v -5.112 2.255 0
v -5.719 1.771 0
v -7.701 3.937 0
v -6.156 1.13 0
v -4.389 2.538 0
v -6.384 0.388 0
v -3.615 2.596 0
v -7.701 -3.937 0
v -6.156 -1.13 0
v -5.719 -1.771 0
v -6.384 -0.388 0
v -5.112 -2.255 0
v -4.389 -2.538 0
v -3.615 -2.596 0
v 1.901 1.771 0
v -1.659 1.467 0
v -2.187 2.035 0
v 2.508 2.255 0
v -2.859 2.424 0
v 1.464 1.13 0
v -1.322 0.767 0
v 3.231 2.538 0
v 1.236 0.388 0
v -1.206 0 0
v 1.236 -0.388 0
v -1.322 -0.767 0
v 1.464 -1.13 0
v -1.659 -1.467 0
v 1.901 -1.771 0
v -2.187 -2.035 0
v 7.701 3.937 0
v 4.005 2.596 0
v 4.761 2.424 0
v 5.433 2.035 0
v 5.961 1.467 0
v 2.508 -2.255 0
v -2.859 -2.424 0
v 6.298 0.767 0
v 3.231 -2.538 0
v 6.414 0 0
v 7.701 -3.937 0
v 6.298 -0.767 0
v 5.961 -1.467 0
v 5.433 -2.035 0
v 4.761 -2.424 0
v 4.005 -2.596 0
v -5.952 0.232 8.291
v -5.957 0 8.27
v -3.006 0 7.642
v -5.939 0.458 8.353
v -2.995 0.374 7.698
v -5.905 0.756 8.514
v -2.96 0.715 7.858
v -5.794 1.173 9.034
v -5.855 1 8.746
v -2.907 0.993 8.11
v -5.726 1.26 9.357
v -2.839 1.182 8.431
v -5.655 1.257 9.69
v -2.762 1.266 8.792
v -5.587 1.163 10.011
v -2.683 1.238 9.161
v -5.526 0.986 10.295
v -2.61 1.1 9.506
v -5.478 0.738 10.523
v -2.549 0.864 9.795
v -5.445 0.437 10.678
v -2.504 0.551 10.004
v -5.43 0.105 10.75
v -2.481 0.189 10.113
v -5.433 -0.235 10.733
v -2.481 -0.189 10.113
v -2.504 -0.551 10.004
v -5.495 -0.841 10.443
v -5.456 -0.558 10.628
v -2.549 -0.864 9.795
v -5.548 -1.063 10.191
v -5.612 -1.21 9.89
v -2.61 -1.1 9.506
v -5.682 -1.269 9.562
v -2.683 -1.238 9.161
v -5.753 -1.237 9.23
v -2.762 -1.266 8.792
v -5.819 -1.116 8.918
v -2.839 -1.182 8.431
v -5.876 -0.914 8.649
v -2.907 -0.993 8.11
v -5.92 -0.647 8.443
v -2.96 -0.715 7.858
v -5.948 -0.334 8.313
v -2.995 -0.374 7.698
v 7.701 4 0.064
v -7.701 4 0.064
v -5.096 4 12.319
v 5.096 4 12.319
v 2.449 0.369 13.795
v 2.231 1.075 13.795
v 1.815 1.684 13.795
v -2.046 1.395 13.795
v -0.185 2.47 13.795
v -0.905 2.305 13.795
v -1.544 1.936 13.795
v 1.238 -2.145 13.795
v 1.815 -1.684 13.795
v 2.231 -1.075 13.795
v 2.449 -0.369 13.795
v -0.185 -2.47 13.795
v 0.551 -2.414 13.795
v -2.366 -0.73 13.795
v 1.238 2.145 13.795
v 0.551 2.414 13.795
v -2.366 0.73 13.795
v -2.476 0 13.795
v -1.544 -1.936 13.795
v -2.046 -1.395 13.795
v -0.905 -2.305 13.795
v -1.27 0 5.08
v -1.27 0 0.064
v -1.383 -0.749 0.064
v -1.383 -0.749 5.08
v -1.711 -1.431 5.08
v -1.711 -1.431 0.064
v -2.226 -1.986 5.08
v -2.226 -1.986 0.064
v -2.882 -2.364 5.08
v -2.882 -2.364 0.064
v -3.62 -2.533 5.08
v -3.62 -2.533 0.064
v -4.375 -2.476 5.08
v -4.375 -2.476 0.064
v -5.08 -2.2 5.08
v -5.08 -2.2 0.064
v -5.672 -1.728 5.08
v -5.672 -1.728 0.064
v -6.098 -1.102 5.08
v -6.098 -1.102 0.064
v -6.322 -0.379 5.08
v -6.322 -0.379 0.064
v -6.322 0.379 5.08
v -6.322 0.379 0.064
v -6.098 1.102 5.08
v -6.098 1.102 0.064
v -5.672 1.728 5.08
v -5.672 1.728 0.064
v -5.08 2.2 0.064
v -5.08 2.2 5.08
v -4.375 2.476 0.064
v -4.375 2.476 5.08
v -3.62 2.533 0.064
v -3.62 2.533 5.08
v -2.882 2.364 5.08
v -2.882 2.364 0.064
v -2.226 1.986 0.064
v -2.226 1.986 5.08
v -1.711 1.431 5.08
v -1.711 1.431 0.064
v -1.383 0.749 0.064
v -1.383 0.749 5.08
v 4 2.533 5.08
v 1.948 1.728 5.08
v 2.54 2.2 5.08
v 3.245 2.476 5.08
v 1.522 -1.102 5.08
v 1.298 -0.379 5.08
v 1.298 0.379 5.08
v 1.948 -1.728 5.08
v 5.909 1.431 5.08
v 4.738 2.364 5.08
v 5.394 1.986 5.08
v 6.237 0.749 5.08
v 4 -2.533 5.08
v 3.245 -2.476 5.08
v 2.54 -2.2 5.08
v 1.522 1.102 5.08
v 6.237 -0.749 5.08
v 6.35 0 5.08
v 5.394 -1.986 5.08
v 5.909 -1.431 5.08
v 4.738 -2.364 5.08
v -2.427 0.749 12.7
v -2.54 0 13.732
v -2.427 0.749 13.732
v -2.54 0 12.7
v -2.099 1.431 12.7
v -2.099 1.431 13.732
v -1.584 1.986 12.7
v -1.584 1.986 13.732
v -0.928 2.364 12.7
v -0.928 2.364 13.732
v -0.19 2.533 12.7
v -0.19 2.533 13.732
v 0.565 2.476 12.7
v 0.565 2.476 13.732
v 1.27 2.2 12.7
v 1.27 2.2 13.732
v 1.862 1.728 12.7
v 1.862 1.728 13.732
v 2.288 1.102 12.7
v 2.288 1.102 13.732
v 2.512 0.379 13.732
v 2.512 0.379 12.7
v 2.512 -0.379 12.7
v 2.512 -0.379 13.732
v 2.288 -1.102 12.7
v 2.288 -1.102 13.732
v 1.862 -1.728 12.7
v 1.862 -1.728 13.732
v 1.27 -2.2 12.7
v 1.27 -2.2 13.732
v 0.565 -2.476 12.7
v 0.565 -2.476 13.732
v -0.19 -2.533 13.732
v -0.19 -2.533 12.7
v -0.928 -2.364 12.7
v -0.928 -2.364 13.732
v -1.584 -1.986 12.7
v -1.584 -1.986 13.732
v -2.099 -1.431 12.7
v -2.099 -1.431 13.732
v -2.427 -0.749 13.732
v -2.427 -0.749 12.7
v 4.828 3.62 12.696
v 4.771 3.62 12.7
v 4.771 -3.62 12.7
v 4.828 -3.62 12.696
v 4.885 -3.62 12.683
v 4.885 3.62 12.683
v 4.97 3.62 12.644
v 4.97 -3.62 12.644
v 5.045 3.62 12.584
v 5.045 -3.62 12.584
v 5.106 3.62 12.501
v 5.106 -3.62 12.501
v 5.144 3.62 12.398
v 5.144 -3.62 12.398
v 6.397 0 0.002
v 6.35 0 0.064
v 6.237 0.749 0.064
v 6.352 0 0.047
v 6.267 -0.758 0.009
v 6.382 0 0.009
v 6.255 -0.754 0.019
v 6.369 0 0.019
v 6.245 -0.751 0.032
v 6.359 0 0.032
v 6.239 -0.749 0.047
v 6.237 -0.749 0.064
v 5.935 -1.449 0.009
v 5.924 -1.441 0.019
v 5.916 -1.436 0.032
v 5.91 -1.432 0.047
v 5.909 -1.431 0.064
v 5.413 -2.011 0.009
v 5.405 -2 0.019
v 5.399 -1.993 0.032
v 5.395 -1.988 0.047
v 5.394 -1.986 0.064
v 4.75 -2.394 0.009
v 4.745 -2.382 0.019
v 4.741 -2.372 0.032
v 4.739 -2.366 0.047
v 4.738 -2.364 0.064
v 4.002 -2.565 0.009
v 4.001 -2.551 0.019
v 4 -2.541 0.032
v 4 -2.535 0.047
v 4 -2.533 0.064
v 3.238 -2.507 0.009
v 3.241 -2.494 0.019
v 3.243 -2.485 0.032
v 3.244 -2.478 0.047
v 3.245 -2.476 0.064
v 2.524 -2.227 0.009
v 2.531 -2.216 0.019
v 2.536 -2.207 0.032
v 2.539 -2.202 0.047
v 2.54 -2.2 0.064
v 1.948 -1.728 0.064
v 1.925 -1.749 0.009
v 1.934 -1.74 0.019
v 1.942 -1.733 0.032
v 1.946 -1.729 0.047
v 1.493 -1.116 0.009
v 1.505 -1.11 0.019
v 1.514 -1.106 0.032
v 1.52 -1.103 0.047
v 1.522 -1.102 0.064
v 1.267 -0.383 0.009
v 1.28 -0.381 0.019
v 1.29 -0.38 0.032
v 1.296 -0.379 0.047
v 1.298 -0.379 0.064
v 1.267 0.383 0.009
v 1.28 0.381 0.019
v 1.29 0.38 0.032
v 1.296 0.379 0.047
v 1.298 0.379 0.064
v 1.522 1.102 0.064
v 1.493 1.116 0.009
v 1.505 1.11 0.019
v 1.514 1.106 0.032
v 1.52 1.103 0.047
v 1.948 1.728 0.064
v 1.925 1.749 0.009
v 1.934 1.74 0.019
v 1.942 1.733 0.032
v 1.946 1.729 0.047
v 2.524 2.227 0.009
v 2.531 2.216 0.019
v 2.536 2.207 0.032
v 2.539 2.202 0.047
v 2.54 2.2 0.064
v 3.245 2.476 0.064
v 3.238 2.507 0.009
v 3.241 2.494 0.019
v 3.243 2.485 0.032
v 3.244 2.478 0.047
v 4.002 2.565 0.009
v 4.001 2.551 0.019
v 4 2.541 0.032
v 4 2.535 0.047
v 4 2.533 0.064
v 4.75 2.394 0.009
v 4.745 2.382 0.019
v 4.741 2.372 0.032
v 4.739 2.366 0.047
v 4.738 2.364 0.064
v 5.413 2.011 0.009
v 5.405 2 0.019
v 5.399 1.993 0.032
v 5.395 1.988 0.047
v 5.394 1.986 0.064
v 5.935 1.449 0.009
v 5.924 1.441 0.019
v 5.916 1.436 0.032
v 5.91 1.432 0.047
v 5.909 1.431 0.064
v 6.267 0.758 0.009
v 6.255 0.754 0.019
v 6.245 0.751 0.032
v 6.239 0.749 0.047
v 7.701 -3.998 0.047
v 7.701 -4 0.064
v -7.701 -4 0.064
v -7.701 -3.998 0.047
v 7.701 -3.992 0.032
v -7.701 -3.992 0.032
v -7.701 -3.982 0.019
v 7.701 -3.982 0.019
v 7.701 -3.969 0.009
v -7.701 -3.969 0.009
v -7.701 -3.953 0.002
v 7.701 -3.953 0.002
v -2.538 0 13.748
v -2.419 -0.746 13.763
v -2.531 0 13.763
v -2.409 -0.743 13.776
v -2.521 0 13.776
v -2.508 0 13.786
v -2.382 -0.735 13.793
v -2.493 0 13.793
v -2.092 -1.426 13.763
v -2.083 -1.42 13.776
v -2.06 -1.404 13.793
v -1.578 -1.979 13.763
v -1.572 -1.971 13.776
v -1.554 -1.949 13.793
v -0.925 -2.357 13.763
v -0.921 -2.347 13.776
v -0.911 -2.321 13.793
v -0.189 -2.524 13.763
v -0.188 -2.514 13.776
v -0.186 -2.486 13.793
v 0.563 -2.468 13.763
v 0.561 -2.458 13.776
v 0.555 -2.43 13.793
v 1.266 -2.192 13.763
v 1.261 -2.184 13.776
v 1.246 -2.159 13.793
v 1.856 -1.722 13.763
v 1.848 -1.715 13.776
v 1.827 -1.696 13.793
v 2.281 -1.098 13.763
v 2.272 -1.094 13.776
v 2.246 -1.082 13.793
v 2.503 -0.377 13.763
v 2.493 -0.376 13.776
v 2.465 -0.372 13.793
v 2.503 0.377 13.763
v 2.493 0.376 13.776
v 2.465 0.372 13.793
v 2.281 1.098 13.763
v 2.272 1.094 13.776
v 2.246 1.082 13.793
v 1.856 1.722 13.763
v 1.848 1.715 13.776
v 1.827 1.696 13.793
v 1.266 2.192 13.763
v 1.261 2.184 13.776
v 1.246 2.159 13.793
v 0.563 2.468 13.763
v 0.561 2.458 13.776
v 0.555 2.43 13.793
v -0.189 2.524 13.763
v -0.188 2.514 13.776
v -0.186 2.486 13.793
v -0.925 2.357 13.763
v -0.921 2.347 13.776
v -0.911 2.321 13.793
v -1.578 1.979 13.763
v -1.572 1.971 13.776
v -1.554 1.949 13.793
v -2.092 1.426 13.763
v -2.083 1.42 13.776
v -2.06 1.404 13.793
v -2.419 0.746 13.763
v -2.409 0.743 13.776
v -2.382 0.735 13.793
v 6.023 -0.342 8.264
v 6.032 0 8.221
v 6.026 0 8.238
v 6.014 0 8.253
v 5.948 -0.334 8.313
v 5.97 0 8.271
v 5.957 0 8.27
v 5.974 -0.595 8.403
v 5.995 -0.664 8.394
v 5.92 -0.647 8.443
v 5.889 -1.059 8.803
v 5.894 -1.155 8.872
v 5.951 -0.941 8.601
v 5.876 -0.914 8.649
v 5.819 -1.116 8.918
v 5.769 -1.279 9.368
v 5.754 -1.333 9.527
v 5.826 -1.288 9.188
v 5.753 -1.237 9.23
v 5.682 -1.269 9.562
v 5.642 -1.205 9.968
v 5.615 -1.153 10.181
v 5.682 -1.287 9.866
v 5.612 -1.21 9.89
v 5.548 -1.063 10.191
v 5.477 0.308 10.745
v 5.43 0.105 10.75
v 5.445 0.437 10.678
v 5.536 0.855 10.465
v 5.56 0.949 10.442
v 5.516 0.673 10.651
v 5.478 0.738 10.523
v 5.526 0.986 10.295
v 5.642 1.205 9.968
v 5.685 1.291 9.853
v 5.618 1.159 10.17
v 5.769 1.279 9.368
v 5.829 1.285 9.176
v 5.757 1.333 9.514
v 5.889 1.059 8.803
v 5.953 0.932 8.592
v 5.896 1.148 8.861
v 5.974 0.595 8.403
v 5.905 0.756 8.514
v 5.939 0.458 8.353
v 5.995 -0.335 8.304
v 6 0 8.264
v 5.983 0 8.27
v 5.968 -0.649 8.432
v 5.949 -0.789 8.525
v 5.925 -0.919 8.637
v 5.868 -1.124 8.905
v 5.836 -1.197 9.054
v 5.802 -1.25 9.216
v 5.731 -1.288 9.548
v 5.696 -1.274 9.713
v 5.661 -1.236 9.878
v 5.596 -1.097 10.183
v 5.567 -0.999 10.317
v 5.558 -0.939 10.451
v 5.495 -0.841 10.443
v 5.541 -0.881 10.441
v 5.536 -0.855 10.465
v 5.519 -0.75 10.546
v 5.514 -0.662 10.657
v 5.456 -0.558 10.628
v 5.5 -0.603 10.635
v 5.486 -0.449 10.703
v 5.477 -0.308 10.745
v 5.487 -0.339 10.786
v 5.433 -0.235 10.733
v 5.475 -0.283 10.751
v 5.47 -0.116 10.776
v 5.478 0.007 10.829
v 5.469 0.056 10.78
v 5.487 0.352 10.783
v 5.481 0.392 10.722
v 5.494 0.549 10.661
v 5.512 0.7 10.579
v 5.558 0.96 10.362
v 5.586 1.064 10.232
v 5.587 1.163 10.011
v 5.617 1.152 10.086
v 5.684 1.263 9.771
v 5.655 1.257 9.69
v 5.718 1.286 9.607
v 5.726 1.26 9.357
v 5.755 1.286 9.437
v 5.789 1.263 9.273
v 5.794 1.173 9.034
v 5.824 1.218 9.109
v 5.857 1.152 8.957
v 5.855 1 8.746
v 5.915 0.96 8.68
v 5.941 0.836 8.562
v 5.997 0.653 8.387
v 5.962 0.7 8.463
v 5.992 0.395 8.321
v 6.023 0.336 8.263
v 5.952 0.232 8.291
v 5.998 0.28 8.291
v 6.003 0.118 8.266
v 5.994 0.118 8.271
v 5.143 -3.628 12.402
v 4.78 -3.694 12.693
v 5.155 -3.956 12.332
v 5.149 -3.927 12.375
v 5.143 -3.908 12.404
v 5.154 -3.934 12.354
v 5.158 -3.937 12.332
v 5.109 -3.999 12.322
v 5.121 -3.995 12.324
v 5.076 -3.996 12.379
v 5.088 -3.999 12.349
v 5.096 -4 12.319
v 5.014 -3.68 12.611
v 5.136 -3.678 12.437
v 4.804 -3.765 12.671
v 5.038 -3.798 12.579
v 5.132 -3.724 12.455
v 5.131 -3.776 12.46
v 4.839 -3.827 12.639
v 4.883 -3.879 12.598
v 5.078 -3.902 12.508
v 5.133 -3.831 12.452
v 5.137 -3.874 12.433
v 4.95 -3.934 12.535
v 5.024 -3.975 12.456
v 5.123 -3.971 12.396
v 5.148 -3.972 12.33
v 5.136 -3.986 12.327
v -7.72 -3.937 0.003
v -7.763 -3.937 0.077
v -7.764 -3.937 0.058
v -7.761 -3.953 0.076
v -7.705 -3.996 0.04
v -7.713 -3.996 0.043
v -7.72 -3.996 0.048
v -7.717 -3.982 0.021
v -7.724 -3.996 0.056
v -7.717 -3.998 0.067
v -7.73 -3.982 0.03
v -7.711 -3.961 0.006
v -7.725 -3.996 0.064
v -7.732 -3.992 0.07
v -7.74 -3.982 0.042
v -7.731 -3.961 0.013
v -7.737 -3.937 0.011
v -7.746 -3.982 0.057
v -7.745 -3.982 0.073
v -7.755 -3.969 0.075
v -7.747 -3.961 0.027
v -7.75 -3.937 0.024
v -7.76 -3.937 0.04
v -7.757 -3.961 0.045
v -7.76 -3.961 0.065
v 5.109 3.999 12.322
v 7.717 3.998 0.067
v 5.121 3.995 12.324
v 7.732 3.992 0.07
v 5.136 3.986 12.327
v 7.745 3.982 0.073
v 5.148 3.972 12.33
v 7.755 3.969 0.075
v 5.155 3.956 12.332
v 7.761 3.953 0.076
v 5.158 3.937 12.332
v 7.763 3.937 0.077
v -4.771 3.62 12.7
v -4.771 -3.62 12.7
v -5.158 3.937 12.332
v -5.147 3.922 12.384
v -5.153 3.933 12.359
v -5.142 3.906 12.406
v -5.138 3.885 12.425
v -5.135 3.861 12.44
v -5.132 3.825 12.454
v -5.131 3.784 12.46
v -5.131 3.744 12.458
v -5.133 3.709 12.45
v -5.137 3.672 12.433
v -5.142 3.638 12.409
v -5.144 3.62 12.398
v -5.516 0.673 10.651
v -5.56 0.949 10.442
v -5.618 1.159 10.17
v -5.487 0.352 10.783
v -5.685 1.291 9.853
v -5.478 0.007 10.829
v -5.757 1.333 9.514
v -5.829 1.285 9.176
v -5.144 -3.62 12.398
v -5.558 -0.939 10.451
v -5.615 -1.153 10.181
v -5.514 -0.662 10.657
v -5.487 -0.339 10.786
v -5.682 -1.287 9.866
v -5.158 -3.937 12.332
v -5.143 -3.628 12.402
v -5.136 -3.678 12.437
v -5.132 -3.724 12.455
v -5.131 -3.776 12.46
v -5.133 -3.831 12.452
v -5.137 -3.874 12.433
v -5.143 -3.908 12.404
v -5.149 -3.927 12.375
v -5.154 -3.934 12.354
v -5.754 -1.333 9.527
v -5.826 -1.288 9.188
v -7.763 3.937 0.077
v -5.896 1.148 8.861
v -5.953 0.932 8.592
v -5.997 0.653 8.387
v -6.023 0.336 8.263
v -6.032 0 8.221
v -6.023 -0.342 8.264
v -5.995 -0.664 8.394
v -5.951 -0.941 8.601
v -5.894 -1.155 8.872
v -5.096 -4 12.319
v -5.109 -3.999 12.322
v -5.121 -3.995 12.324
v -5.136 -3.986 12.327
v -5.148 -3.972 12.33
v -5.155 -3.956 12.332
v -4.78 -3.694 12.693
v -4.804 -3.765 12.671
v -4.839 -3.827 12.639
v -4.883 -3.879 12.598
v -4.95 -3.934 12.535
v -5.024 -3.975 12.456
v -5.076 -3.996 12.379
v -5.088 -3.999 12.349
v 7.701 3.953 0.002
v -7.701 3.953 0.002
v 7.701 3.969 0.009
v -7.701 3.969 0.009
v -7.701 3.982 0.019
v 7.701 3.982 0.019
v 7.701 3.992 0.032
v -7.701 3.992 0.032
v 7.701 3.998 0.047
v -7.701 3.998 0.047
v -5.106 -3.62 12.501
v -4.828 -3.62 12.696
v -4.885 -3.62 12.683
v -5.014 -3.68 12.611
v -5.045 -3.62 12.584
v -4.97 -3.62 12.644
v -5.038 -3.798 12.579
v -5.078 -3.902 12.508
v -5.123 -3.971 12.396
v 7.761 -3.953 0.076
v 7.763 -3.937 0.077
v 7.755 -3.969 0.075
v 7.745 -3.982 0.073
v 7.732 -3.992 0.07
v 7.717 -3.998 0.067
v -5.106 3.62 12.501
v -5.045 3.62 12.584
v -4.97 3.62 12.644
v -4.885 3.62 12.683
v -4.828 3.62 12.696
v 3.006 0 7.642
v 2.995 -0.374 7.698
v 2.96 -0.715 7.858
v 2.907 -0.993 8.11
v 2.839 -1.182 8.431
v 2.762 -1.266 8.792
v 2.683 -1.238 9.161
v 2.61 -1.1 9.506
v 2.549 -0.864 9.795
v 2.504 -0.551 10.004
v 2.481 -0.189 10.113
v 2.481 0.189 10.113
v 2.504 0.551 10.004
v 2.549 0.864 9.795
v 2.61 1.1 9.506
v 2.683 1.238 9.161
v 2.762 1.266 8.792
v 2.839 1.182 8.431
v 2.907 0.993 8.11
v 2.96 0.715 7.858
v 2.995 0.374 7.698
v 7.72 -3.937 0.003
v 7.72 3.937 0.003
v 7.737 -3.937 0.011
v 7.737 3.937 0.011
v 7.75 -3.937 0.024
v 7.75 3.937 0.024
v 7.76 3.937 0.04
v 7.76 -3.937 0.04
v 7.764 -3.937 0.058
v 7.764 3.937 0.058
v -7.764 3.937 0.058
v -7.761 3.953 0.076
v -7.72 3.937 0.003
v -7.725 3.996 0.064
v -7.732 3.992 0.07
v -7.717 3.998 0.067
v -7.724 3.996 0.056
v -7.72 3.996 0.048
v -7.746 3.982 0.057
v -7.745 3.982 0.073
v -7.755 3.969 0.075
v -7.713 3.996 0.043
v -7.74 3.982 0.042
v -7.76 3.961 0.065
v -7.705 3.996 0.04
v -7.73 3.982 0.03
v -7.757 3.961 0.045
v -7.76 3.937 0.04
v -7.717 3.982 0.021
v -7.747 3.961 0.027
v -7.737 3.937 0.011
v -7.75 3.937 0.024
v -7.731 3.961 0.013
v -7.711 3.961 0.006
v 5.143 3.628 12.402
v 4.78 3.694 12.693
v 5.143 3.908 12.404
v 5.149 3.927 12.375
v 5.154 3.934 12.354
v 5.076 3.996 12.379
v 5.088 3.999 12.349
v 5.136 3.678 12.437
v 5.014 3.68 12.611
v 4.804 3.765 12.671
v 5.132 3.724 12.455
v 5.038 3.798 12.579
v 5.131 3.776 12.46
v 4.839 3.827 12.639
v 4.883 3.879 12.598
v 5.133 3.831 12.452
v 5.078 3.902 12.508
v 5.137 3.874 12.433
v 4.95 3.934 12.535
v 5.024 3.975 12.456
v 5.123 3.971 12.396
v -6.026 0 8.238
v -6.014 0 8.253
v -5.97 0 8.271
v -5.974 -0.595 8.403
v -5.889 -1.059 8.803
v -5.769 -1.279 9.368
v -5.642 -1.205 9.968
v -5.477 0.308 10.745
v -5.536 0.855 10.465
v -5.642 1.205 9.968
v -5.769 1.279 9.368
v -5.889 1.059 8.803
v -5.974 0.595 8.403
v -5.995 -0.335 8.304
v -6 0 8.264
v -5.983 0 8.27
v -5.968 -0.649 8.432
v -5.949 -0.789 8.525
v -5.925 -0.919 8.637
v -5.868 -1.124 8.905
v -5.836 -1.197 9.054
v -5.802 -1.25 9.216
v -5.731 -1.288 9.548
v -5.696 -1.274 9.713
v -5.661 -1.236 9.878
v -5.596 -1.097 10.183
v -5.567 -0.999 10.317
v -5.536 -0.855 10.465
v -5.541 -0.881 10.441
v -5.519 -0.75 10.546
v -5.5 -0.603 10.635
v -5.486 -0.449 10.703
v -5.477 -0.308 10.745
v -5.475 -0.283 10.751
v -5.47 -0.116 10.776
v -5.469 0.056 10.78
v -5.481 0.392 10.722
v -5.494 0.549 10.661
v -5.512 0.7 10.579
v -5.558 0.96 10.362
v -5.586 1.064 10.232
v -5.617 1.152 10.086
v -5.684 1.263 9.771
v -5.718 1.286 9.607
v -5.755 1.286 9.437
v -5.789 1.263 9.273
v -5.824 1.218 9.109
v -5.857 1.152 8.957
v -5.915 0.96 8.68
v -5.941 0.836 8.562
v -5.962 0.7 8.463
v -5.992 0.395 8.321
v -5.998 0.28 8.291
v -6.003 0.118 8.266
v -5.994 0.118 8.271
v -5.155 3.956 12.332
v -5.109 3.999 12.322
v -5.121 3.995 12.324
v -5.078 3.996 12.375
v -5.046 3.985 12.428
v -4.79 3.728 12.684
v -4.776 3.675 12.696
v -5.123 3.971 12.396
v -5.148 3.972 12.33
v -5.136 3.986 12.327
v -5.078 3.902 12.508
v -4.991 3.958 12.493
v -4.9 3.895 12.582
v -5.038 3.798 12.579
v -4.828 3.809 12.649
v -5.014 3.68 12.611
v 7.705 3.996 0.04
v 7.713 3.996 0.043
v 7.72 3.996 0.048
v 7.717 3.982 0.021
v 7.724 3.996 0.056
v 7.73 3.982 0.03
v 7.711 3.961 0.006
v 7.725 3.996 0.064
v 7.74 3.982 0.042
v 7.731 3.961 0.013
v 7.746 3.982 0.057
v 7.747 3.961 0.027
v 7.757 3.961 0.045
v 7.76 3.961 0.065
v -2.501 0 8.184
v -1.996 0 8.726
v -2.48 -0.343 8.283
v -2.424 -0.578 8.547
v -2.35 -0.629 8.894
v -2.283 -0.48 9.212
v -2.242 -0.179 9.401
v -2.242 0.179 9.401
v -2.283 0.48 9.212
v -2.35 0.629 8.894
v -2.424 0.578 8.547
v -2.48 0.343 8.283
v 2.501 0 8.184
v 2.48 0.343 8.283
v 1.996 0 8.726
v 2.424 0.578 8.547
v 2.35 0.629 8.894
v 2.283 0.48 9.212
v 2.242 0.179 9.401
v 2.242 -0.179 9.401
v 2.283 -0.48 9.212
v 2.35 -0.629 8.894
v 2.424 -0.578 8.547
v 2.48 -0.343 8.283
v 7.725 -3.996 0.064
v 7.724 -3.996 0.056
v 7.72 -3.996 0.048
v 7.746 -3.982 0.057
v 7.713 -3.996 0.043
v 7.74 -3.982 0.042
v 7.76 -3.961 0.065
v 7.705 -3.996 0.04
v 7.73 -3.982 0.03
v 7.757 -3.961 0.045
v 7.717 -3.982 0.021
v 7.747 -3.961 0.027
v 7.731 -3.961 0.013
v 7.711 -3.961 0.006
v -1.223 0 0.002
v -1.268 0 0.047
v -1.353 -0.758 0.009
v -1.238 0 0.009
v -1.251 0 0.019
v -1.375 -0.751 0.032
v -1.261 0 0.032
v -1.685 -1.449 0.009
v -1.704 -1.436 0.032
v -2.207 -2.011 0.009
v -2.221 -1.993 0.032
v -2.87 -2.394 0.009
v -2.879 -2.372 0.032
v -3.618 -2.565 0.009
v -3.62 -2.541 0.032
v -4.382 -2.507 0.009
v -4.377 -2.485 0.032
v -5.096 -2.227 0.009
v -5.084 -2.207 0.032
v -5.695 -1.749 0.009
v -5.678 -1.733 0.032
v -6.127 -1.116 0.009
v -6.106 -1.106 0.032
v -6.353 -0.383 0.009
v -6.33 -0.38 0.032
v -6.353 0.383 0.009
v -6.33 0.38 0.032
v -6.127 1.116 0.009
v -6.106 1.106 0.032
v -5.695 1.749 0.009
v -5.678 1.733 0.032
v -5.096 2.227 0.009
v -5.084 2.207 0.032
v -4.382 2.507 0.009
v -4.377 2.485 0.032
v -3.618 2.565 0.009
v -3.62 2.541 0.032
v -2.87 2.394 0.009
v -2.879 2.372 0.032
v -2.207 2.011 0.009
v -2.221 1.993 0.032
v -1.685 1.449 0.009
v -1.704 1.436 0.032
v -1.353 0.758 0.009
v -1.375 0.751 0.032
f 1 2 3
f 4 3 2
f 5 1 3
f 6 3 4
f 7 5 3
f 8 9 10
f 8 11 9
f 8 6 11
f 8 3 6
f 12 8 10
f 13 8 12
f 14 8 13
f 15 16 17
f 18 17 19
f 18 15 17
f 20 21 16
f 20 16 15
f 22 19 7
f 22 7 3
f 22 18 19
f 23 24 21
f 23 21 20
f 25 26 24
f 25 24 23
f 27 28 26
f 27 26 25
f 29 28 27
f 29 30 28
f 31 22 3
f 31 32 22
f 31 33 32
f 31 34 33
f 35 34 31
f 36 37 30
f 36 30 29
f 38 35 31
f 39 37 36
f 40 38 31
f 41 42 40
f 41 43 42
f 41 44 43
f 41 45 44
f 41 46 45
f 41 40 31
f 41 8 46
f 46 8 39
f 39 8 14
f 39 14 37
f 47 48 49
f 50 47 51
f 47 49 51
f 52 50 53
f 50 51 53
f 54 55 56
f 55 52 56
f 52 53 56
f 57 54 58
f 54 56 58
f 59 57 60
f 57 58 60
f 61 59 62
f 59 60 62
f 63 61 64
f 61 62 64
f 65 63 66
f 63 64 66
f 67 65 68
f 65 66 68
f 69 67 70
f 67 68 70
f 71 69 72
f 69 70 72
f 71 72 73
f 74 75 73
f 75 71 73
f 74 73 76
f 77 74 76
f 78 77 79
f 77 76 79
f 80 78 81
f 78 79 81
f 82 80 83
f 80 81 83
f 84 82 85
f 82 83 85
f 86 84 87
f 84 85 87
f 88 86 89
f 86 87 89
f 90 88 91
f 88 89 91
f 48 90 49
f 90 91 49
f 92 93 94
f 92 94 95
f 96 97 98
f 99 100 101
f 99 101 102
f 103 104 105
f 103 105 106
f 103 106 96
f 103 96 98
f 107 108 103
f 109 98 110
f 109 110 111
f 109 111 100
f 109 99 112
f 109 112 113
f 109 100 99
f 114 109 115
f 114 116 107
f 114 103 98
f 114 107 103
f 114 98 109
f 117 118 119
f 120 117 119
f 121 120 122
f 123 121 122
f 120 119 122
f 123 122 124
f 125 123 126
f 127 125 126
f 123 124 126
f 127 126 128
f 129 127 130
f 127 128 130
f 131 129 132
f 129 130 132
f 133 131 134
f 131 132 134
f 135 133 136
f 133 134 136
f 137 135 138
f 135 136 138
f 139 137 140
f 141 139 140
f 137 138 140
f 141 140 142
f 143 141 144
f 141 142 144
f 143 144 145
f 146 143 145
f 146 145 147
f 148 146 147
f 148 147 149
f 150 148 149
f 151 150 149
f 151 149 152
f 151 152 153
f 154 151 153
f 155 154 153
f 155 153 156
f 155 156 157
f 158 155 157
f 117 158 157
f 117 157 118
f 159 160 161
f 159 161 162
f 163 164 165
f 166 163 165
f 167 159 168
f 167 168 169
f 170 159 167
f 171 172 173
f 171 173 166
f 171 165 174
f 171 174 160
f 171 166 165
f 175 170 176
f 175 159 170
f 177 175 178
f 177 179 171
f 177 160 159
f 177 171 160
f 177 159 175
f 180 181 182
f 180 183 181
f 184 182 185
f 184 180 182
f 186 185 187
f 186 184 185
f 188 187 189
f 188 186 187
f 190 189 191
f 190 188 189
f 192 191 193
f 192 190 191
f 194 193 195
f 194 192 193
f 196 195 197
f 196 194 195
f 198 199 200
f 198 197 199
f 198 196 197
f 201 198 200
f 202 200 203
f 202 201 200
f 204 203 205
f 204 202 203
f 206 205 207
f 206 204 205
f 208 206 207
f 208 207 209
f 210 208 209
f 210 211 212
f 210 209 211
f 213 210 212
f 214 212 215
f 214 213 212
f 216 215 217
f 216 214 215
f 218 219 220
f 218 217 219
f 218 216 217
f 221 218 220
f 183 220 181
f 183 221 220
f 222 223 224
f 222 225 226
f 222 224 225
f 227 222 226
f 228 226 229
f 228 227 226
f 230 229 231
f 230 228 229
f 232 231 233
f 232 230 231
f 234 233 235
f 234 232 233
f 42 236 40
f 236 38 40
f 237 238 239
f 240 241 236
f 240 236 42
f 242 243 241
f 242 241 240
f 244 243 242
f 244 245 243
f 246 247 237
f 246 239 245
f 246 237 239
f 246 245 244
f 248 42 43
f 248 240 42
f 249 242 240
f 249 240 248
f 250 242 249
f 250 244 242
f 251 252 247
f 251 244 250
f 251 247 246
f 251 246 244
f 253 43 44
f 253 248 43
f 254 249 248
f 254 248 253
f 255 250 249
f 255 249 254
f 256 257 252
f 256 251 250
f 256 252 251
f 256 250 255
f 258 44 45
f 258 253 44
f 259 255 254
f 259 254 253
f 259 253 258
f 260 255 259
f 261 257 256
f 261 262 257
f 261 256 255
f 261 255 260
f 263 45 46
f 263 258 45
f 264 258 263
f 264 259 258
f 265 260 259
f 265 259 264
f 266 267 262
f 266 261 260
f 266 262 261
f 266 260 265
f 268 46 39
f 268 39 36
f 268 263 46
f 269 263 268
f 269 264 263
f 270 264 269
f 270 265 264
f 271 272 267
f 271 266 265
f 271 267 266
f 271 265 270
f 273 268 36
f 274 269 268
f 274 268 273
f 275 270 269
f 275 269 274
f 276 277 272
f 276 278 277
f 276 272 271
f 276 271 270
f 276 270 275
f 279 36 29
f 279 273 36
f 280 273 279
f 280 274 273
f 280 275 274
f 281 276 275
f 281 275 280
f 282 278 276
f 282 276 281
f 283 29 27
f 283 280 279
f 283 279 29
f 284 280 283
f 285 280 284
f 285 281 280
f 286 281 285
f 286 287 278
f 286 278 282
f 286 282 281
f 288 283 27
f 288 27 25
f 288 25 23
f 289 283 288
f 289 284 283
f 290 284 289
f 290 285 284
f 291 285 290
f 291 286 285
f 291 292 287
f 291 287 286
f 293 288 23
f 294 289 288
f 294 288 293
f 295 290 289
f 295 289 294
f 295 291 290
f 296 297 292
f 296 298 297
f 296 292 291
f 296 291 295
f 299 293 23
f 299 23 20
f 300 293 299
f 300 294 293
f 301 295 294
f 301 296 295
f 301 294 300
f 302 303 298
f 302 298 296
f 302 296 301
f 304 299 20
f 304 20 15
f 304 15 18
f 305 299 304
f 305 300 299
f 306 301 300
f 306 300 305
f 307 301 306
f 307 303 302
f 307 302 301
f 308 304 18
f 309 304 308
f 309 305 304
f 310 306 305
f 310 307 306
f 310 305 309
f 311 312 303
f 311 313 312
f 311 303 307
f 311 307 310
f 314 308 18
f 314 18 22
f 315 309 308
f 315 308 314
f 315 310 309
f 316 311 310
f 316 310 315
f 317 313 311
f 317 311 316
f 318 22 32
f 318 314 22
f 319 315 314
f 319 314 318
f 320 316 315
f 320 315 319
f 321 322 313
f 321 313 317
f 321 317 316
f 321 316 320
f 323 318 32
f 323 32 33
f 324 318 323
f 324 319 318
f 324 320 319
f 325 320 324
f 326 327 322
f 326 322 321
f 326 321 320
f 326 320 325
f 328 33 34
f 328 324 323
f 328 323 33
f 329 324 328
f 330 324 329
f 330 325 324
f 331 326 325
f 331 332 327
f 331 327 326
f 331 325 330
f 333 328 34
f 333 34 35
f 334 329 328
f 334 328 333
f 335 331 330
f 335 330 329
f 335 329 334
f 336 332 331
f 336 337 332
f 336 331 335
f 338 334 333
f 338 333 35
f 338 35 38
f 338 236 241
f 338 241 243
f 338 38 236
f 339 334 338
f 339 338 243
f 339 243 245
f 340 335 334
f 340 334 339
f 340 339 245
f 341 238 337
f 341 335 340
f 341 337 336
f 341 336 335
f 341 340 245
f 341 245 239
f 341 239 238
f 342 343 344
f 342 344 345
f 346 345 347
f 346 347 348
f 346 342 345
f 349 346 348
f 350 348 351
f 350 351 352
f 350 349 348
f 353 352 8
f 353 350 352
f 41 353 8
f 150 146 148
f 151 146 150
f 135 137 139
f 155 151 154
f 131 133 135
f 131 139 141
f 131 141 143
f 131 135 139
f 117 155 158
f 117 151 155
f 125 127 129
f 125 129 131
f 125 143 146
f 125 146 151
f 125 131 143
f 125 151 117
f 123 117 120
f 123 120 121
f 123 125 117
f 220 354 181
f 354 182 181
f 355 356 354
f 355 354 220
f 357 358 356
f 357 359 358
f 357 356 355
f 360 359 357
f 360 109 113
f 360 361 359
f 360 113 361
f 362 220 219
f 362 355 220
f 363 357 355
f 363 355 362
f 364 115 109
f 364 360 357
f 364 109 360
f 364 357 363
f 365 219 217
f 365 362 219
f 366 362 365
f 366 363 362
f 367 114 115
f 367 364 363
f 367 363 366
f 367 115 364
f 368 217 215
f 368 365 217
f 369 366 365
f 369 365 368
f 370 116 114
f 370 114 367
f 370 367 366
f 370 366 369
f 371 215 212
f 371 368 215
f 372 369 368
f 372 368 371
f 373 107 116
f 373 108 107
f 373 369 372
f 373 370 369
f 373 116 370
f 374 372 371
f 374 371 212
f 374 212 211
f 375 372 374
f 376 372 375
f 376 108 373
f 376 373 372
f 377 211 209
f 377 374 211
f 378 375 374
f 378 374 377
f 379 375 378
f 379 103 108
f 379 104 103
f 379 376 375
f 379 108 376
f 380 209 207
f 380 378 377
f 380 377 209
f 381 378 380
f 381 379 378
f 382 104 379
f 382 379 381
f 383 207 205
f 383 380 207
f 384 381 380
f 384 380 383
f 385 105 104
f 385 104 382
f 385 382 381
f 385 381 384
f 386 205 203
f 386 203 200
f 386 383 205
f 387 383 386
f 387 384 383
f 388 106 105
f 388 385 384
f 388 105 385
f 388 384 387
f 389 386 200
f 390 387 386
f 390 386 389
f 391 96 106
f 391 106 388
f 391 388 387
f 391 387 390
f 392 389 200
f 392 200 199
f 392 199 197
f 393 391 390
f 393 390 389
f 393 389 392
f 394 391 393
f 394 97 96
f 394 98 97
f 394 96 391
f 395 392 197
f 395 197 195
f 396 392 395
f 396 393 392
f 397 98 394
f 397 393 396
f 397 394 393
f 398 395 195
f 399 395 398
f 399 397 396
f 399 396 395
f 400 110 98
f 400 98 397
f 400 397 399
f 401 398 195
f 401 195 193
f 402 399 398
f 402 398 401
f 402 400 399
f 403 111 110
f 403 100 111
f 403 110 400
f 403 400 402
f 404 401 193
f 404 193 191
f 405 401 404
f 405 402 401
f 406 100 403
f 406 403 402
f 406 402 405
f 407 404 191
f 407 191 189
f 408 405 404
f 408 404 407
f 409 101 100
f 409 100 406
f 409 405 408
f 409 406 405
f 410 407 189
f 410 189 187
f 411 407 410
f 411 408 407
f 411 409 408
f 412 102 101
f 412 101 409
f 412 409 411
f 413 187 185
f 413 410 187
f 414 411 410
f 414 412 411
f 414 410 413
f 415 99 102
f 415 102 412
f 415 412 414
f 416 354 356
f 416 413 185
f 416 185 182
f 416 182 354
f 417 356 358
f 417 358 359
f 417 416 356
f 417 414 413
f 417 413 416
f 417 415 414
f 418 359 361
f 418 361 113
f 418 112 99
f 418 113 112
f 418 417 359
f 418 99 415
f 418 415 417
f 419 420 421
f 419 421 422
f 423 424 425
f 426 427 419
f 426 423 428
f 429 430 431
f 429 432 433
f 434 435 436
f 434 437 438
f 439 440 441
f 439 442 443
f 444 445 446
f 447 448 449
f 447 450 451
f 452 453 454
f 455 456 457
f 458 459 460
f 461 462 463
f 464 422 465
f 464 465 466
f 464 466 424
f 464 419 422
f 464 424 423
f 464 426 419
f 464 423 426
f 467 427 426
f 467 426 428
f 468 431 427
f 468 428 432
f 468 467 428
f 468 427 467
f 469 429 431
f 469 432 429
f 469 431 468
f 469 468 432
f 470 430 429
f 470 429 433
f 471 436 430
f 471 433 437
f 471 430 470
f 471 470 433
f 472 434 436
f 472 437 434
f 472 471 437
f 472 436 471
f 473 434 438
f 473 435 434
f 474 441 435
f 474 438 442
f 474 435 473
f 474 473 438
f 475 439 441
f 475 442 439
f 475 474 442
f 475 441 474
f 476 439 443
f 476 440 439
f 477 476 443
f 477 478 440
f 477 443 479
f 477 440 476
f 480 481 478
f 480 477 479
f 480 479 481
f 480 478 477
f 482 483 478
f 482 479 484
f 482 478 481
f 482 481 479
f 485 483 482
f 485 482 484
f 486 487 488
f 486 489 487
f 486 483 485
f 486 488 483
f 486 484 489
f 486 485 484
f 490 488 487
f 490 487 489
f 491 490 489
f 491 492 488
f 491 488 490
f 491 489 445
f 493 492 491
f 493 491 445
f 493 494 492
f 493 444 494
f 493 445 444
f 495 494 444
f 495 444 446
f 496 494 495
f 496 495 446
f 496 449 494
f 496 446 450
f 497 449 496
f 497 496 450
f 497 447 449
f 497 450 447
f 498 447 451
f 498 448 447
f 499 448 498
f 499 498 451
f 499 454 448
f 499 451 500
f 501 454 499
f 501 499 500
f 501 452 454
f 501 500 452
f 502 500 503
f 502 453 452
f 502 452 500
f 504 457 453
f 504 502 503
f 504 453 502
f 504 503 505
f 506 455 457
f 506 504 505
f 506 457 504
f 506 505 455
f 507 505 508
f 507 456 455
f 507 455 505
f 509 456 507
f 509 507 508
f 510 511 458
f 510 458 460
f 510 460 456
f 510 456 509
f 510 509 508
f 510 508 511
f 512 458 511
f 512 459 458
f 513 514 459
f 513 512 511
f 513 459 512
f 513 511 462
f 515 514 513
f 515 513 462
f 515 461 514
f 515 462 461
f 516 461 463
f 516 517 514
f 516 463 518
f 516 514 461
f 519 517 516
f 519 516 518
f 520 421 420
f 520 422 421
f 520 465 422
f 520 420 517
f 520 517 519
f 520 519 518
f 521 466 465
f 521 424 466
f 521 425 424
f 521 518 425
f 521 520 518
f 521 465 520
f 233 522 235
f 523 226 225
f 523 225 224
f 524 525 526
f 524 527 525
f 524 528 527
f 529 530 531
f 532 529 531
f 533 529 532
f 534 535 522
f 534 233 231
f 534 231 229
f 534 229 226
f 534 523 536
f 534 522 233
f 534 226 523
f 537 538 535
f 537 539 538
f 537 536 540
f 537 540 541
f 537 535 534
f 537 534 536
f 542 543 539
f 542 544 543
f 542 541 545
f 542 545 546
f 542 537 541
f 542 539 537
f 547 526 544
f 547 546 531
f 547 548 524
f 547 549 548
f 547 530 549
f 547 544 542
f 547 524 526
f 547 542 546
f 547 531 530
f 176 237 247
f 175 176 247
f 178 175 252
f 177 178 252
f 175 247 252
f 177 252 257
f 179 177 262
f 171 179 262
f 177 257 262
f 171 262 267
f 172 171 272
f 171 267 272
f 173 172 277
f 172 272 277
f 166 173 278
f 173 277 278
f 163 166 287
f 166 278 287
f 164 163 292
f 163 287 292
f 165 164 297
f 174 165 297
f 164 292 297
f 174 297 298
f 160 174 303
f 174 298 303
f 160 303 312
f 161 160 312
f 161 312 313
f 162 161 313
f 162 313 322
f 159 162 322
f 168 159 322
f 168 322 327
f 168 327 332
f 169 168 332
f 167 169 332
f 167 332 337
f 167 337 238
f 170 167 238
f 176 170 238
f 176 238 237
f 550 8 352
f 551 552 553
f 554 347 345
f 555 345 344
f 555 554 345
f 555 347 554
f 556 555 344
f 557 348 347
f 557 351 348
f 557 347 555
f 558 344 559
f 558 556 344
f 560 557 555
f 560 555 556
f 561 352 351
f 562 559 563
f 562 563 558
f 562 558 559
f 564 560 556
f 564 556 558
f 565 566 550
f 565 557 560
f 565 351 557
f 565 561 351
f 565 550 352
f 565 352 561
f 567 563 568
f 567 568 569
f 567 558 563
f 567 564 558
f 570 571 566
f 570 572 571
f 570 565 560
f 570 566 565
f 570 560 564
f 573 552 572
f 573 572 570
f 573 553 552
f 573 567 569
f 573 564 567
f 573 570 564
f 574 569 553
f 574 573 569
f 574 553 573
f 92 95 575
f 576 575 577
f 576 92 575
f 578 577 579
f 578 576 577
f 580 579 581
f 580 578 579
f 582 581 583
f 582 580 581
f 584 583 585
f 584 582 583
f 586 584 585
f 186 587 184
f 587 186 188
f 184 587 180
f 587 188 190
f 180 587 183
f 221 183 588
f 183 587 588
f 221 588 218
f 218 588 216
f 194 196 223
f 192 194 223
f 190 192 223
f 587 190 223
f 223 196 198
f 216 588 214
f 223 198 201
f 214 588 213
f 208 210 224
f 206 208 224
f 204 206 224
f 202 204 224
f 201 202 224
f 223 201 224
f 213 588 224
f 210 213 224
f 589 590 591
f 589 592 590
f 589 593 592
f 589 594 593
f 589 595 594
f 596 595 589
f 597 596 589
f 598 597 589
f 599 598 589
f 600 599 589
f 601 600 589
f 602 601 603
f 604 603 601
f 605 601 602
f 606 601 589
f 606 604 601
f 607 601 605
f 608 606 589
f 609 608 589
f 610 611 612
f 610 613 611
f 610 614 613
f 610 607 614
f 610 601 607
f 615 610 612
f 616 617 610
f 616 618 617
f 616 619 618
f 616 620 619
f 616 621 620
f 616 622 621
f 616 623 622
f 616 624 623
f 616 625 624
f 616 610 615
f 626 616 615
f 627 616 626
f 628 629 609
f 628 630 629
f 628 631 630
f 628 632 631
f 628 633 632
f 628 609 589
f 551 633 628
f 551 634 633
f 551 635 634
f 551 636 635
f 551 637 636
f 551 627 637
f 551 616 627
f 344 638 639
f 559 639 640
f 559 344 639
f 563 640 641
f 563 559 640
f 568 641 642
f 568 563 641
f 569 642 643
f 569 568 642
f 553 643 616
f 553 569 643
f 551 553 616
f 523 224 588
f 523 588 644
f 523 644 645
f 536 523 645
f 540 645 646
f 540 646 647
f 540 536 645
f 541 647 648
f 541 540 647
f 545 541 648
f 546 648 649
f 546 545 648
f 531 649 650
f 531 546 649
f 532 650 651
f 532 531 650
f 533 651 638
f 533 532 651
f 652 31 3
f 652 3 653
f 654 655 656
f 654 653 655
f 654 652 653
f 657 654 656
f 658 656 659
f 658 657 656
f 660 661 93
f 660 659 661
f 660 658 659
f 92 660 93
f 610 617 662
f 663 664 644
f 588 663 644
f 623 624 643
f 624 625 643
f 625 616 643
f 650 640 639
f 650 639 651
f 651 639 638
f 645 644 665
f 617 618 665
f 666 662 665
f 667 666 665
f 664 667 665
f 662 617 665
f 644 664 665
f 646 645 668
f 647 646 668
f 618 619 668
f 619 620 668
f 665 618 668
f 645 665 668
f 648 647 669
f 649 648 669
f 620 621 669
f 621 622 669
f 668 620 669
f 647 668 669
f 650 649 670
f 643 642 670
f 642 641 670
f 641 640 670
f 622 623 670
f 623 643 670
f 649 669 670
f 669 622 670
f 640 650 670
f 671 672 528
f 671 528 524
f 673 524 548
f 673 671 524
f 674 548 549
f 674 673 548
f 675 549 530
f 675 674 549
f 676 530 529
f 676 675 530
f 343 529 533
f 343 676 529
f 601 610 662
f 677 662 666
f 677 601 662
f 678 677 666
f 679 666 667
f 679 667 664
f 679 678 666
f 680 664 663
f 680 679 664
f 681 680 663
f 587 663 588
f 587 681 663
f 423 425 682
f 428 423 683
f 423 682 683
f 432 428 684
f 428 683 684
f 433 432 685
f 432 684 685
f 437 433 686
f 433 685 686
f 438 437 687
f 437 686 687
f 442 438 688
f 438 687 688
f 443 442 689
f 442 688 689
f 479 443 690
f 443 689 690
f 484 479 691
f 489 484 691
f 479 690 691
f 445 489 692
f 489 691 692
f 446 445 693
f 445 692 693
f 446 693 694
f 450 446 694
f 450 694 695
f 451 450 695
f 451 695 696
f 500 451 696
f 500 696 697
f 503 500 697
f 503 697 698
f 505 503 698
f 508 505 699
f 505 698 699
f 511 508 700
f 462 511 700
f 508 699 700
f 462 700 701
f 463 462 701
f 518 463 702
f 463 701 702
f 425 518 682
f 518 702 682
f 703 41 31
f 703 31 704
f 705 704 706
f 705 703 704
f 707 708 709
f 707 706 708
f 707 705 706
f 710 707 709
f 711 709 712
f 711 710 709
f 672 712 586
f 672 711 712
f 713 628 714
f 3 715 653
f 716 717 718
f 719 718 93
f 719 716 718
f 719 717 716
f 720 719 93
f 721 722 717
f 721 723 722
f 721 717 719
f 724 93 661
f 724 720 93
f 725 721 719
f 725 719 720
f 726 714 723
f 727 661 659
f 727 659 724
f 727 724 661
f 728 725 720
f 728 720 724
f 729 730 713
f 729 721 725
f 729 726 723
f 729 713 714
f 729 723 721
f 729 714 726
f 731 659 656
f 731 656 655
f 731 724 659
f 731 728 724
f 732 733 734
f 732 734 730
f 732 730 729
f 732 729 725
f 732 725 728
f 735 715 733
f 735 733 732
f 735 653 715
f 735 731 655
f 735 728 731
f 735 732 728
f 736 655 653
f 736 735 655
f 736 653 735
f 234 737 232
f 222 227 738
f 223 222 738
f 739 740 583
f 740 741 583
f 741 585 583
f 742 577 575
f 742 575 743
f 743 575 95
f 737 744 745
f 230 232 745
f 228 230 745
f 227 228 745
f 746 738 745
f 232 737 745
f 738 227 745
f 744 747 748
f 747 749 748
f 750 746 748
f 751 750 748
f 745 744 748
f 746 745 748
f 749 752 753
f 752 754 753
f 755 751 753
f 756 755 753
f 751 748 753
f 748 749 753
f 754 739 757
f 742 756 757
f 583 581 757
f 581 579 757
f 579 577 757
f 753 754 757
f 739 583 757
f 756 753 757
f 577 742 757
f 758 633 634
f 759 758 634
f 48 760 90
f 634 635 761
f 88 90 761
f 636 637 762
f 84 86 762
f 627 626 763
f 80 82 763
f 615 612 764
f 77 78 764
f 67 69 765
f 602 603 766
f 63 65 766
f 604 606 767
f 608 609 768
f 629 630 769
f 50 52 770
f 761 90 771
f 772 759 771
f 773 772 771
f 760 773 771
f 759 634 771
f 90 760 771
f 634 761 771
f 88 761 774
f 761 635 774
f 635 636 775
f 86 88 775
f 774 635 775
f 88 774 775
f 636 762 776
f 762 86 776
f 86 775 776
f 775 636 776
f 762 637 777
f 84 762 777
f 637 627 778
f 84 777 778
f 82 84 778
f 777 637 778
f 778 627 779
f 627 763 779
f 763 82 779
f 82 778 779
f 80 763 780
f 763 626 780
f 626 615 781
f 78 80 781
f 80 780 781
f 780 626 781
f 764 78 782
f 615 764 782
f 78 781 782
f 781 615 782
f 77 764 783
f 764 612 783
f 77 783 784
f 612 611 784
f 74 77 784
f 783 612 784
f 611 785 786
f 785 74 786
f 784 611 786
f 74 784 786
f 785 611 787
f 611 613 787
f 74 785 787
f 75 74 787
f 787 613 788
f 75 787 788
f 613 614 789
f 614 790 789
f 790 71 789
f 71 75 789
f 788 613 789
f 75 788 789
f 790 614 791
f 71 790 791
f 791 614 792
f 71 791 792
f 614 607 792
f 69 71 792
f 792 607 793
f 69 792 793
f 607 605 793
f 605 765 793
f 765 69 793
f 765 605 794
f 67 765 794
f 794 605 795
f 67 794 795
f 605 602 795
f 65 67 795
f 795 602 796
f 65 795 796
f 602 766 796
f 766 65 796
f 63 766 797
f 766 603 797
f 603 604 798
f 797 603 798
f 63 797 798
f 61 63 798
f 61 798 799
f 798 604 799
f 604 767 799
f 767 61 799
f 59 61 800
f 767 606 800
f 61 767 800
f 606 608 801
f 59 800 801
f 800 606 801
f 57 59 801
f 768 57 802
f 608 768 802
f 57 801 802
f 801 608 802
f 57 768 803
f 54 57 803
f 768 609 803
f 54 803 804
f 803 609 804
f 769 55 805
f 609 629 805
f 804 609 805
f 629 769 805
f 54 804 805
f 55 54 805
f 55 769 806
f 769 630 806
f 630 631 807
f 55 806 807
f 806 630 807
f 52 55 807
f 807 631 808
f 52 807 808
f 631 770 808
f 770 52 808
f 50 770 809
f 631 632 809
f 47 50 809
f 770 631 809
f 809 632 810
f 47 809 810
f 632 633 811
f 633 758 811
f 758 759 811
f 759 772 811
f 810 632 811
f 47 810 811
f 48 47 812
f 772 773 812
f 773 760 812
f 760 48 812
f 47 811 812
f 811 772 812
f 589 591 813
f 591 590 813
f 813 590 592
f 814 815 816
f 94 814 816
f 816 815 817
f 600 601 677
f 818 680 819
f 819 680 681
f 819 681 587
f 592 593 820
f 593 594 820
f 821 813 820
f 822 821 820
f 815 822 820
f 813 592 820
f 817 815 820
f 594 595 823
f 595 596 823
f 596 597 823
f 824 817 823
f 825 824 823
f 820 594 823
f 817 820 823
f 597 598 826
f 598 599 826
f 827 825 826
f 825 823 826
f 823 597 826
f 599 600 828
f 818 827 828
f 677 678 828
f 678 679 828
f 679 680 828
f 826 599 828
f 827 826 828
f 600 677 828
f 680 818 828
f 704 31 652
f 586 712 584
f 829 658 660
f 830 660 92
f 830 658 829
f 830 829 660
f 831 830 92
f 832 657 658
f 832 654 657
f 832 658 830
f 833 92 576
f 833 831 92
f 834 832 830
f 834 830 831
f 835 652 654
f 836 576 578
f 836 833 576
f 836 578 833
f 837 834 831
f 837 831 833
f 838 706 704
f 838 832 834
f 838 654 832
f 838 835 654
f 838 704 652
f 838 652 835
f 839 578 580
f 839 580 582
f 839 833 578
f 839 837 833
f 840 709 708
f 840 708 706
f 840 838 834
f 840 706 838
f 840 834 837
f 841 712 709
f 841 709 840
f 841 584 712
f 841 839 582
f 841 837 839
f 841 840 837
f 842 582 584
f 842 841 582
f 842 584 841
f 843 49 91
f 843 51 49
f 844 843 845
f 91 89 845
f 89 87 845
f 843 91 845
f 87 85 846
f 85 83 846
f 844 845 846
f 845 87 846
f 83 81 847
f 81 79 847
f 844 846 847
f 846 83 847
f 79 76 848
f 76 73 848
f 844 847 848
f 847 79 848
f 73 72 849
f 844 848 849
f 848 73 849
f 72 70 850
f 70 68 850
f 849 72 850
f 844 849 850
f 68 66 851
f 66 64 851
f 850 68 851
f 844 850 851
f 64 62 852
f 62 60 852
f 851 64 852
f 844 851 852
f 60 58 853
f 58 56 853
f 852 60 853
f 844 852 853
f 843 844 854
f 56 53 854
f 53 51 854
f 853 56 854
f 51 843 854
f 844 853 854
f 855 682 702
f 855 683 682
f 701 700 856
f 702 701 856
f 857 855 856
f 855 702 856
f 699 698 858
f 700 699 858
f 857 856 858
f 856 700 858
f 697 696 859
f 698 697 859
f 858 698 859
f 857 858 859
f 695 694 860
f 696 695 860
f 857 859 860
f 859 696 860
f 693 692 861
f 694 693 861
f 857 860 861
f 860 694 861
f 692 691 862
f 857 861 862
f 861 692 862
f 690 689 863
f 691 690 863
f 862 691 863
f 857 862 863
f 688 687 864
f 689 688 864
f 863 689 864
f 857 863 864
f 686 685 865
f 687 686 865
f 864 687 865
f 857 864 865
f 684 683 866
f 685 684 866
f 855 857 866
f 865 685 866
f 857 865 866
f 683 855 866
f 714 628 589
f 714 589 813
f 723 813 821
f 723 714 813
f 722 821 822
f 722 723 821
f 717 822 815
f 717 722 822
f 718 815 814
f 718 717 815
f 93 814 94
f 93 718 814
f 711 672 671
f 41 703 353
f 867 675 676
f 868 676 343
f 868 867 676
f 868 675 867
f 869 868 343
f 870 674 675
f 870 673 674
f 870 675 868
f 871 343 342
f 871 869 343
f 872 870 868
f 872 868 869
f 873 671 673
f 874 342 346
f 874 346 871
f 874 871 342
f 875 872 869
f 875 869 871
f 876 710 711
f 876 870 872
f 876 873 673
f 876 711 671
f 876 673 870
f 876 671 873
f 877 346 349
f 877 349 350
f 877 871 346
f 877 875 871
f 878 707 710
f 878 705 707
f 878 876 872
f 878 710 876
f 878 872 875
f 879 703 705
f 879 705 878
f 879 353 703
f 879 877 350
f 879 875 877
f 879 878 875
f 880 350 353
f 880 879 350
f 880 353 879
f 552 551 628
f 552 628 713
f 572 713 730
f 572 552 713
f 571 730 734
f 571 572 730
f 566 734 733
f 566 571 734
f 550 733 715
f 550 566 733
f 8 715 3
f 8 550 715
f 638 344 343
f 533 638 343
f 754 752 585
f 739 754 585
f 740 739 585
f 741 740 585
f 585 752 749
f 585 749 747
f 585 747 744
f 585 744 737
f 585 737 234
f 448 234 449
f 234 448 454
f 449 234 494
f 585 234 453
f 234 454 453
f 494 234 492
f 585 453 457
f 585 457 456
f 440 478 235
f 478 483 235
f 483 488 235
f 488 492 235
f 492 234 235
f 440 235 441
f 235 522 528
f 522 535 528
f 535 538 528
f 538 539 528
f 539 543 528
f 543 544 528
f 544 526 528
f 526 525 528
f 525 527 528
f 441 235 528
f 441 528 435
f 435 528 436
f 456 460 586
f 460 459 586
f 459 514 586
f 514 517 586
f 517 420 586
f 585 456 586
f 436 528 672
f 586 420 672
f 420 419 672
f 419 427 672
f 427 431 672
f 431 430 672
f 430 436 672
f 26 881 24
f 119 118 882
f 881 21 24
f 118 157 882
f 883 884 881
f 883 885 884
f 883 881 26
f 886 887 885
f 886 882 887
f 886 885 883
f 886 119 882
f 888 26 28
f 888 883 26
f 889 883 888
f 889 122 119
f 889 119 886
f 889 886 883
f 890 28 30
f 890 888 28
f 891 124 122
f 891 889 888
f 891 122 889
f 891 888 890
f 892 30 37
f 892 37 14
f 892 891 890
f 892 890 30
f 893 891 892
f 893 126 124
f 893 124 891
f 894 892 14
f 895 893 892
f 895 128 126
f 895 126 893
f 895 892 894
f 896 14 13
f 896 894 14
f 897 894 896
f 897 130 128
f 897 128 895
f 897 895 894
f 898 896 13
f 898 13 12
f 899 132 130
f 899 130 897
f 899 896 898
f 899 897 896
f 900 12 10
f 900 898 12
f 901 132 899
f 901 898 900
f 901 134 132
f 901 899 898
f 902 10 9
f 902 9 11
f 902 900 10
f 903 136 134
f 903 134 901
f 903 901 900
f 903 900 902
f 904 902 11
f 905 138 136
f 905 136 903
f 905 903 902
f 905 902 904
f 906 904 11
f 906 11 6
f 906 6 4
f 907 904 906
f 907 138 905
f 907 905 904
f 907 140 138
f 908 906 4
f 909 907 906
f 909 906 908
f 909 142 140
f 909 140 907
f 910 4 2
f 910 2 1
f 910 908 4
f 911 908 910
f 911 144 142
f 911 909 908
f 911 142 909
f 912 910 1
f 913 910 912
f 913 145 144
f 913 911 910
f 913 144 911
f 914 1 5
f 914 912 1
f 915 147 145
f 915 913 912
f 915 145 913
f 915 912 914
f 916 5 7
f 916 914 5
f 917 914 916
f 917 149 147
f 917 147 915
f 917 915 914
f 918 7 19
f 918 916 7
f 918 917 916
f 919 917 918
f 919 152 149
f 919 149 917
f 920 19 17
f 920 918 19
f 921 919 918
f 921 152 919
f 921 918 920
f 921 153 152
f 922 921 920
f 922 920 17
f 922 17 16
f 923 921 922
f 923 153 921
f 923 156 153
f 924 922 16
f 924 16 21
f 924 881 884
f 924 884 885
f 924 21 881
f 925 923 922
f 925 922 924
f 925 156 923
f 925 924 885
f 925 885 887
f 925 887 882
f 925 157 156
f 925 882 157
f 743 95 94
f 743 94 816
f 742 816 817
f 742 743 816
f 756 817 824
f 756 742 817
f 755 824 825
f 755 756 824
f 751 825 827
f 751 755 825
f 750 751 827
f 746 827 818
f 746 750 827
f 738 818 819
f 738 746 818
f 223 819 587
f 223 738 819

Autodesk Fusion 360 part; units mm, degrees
sketch "Body" plane through (0, 0, 0) normal (0, 1, 0) x (1, 0, 0)
  line L0 (0, 0) -> (0, -12.7) construction
  line L1 (-5.08, -12.7) -> (5.08, -12.7)
  line L2 (-7.7795, 0) -> (7.7795, 0)
  line L3 (-5.08, -12.7) -> (-7.7795, 0)
  line L4 (5.08, -12.7) -> (7.7795, 0)
  dimension "d1" = 12.7
  dimension "d2" = 10.16
  dimension "d3" = 78
extrude "Extrude1" add sketch "Body" along normal mid plane 8.001
sketch "Neck" plane through (0, 0, 12.7) normal (0, 0, 1) x (-1, 0, 0)
  line L0 (-5.08, 4.0005) -> (-5.08, -4.0005)
  line L1 (-5.08, -4.0005) -> (5.08, -4.0005)
  line L2 (5.08, -4.0005) -> (5.08, 4.0005)
  line L3 (5.08, 4.0005) -> (-5.08, 4.0005)
  circle A0 centre (0, 0) radius 2.54
  dimension "d6" = 5.08
extrude "Extrude2" add sketch "Neck" along normal blind 1.095 contours A0
sketch "LegHoles" plane through (0, 0, 0) normal (0, 0, -1) x (1, 0, 0)
  line L0 (-7.7795, 4.0005) -> (-7.7795, -4.0005)
  line L1 (-7.7795, -4.0005) -> (7.7795, -4.0005)
  line L2 (7.7795, -4.0005) -> (7.7795, 4.0005)
  line L3 (7.7795, 4.0005) -> (-7.7795, 4.0005)
  circle A0 centre (3.81, 0) radius 2.54
  circle A1 centre (-3.81, 0) radius 2.54
  dimension "d10" = 5.08
  dimension "d11" = 5.08
  dimension "d12" = 3.81
  dimension "d13" = 3.81
extrude "Extrude3" cut sketch "LegHoles" against normal blind 5.08 contours A0 | A1
sketch "HelperLine" plane through (0, -4.0005, 0) normal (0, -1, 0) x (1, 0, 0)
  line L0 (5.08, 12.7) -> (-5.08, 12.7)
  line L1 (-5.08, 12.7) -> (-7.7795, 0)
  line L2 (-7.7795, 0) -> (7.7795, 0)
  line L3 (7.7795, 0) -> (5.08, 12.7)
  line L4 (-5.7549, 9.525) -> (5.7549, 9.525)
  dimension "d16" = 9.525
sketch "ArmHoles" plane through (7.4432, 0, 1.5821) normal (0.9781, 0, 0.2079) x (0, 1, 0)
  line L0 (-4.0005, -1.6174) -> (4.0005, -1.6174)
  line L1 (4.0005, -1.6174) -> (4.0005, 11.3663)
  line L2 (4.0005, 11.3663) -> (-4.0005, 11.3663)
  line L3 (-4.0005, 11.3663) -> (-4.0005, -1.6174)
  line L4 (-4.0005, 10.5134) -> (-4.0005, 8.1204)
  line L5 (-4.0005, 8.1204) -> (0, 8.1204)
hole "Hole1" at (5.7549, 0, 9.525) direction (-0.9781, 0, -0.2079) diameter 2.54 depth 3.08 tip angle 118
mirror "Mirror1" about plane through (0, 0, 0) normal (1, 0, 0) of "Hole1"
fillet "Fillet1" radius 0.381 4 edges at (0, -4.0005, 12.7) (-5.08, 0, 12.7) (0, 4.0005, 12.7) (5.08, 0, 12.7)
fillet "Fillet1" radius 0.0635 7 edges at (6.4297, -4.0005, 6.35) (6.4297, 4.0005, 6.35) (-6.4297, -4.0005, 6.35) (-6.4297, 4.0005, 6.35) (2.3681, 0.9185, 13.795) (5.6594, -1.1841, 9.9742) (-5.8504, -1.1841, 9.0758) 1 faces at (-1.0816, 3.4924, 0)
equation "d13 = d12"
equation "d18 = ( 1.27 * 2 ) * 1 mm"
